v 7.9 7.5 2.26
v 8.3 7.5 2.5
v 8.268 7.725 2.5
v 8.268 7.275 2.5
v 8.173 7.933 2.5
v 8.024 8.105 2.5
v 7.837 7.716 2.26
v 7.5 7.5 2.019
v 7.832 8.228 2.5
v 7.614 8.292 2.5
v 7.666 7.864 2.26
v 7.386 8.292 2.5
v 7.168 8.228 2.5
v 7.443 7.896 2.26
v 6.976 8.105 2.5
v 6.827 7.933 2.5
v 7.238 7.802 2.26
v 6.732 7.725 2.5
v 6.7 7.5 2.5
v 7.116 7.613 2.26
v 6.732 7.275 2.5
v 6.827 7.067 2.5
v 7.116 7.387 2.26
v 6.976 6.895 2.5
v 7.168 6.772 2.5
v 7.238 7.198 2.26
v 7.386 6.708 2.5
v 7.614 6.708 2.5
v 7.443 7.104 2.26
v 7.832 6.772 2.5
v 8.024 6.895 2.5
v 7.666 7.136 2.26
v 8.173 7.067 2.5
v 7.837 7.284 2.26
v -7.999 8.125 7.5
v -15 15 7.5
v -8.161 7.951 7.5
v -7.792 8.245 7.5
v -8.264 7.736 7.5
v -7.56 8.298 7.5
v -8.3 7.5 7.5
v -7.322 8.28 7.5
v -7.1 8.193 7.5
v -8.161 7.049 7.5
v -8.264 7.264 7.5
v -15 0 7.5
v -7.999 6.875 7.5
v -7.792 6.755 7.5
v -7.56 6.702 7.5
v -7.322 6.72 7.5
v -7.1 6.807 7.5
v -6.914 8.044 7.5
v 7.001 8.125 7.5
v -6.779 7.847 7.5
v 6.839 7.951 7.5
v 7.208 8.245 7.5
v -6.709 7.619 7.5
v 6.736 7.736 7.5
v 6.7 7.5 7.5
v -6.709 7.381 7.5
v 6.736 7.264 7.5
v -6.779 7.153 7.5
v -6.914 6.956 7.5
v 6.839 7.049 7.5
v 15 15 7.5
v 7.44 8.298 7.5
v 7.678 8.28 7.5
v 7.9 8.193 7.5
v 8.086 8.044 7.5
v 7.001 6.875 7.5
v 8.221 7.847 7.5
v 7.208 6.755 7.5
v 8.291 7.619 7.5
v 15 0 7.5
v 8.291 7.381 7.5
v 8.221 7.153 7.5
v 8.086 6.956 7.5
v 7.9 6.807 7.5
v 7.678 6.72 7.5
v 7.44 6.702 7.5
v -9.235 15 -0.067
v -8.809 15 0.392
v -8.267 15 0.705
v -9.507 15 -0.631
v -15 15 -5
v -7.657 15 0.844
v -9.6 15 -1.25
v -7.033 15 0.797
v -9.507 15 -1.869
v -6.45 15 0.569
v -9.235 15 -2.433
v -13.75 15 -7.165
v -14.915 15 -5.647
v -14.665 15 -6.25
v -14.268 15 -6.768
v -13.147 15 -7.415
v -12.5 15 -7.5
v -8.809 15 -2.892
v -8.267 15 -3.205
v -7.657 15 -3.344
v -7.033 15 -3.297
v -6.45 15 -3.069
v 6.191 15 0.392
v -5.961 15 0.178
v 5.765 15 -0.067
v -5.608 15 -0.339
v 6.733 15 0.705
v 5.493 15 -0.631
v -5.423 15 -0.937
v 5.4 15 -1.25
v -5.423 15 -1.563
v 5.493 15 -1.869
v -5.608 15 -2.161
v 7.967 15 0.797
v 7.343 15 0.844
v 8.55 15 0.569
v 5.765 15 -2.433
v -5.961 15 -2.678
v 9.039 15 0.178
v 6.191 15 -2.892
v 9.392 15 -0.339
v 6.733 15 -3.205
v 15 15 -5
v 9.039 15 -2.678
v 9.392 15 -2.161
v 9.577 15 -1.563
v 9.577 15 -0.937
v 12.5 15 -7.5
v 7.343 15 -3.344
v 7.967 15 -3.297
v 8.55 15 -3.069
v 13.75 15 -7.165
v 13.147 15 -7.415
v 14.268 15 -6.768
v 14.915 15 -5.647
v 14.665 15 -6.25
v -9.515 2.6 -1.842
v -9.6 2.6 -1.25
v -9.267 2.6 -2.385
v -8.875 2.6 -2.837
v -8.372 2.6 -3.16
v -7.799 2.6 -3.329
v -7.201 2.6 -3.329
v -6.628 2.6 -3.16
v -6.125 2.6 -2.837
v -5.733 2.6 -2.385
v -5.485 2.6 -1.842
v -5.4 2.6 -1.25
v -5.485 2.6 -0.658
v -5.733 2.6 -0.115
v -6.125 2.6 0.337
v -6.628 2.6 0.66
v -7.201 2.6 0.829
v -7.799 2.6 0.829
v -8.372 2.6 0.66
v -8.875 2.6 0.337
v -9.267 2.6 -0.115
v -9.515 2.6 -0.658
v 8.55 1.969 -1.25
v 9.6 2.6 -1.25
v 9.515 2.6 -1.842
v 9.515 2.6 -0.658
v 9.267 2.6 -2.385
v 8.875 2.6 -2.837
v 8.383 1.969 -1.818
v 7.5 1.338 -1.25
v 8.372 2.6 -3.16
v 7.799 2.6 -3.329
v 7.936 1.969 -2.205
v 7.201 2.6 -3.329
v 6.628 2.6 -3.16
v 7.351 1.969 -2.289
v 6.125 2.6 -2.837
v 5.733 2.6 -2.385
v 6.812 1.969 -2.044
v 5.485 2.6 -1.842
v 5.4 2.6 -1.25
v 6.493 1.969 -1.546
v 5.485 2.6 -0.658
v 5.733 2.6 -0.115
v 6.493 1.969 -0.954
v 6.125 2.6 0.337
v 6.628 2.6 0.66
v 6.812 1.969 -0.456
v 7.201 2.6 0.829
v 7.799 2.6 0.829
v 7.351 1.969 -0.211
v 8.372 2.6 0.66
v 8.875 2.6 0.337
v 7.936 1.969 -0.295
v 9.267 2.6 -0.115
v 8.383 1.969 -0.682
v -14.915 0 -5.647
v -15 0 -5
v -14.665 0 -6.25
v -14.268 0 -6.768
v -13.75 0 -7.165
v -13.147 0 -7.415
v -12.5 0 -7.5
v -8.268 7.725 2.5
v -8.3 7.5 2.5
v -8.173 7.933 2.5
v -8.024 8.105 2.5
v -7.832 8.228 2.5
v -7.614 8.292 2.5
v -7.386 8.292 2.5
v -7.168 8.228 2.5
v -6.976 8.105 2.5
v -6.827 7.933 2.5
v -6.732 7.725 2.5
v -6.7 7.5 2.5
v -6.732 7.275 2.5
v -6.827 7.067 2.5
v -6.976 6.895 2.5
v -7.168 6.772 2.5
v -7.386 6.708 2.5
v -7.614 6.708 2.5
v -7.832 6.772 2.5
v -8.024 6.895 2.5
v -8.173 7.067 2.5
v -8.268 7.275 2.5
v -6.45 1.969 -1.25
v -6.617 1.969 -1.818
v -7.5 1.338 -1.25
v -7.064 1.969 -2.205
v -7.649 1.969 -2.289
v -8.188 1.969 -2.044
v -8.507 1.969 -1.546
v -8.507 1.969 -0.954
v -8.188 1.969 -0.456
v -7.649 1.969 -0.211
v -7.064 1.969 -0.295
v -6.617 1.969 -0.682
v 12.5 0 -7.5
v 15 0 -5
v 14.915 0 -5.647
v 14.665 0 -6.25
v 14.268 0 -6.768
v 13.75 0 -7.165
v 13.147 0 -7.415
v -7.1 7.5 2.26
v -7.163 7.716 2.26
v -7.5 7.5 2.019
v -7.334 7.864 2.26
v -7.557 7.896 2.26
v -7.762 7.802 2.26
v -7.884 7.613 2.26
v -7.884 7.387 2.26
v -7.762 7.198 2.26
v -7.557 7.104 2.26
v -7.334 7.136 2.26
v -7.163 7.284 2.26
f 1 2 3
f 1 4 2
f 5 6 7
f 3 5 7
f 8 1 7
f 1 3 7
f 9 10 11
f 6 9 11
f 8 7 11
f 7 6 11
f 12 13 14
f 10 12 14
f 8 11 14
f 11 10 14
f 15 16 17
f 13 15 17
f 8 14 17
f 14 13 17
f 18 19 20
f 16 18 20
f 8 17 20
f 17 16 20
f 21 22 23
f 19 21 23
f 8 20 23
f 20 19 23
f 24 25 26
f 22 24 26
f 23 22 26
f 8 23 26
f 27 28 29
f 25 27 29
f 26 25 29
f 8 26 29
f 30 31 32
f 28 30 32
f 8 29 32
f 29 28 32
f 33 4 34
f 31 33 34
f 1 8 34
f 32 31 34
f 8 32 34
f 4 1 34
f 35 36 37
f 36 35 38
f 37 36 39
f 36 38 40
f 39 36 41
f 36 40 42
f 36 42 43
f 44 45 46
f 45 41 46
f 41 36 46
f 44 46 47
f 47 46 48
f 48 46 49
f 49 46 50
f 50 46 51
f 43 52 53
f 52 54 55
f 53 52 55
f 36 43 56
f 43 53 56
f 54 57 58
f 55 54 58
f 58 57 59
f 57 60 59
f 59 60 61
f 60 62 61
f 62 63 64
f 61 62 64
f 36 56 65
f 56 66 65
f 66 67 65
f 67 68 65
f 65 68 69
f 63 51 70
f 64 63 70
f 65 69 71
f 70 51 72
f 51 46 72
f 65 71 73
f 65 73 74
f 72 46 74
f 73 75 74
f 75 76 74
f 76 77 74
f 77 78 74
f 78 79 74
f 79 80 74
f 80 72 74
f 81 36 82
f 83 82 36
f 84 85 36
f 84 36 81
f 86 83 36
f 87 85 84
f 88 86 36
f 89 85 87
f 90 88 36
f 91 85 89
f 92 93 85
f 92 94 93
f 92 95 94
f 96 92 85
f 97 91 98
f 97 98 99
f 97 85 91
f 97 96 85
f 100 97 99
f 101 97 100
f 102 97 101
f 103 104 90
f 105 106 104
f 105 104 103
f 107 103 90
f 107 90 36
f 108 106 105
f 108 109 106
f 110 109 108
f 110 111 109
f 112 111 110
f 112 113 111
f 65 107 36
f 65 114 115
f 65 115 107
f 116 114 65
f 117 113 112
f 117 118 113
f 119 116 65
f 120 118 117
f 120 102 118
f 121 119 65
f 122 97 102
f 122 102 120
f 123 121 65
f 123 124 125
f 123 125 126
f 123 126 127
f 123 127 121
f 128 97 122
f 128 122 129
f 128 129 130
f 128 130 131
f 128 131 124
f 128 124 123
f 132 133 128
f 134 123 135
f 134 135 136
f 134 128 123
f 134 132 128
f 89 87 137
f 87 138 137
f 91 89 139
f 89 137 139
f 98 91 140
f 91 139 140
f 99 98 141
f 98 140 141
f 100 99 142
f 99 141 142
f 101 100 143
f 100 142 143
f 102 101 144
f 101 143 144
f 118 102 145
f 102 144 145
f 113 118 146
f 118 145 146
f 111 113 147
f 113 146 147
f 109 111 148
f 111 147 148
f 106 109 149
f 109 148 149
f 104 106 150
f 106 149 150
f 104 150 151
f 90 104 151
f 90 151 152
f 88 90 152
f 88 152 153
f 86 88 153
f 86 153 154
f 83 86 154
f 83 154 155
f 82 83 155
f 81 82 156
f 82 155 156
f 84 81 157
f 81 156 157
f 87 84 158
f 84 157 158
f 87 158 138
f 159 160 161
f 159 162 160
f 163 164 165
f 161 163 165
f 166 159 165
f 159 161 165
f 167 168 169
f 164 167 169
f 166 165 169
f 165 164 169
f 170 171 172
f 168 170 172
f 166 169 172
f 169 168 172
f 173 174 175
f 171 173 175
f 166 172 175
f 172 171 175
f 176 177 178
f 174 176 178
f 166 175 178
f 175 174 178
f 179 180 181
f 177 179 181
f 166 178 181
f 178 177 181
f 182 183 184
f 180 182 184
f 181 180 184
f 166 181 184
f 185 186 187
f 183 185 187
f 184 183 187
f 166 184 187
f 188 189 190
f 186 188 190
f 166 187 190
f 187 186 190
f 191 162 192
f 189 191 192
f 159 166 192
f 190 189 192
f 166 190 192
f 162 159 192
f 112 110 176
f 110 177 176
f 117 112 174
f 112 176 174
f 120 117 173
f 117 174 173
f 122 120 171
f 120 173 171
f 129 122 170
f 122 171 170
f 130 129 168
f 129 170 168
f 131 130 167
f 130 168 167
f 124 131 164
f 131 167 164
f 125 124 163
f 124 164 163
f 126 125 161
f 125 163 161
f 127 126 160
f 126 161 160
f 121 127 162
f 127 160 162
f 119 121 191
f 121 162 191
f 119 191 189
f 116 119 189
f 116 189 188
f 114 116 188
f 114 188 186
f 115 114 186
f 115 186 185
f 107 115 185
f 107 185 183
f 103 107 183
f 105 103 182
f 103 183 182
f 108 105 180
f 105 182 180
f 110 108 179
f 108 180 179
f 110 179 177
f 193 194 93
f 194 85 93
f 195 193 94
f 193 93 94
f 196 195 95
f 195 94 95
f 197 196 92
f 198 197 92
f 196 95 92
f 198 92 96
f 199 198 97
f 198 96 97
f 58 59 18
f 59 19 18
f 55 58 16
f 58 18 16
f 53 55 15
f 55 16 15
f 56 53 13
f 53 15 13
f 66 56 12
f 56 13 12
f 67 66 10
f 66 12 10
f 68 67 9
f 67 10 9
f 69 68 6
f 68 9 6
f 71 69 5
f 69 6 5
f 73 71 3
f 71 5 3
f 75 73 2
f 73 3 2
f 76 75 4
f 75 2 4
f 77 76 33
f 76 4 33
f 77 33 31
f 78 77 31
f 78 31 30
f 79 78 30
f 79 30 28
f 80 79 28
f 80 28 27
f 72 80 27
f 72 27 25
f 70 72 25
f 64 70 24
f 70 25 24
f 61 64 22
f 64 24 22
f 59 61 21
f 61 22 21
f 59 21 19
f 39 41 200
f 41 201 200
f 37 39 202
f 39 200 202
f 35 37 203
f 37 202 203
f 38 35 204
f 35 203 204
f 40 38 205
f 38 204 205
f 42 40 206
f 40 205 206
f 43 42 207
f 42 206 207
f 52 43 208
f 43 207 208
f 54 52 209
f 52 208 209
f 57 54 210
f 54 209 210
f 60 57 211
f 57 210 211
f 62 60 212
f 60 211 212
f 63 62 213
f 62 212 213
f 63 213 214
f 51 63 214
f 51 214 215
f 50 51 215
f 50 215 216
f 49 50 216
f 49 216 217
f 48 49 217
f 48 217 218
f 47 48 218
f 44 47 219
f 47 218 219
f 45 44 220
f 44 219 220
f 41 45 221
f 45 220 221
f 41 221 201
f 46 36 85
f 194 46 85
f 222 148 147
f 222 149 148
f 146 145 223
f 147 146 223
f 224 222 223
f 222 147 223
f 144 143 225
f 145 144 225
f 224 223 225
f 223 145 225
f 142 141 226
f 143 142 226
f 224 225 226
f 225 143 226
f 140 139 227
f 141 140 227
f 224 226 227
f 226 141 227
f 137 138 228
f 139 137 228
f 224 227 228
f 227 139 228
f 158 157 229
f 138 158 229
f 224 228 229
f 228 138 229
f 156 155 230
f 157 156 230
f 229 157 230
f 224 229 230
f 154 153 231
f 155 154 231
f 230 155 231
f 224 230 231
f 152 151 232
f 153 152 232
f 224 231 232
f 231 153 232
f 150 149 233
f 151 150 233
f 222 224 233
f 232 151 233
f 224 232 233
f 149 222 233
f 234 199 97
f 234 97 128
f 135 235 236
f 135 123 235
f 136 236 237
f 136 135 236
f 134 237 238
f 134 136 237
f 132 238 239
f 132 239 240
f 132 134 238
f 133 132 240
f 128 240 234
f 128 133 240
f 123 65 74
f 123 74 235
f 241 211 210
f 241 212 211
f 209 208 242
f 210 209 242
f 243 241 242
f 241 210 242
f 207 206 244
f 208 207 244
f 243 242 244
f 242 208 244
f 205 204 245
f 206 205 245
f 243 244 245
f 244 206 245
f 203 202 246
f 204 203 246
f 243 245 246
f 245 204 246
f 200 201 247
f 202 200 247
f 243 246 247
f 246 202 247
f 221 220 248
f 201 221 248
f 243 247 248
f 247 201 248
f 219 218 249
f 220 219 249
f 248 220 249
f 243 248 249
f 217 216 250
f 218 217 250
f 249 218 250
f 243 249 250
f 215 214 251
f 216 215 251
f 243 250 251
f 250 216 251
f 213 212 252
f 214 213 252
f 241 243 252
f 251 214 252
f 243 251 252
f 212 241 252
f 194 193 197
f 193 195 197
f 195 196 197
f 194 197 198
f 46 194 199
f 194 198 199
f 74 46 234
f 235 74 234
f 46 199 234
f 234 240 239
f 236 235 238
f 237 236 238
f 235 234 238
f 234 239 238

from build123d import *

# Parameters (mm, degrees)
SKETCH1_W             = 30
SKETCH1_H             = 15
BOSS_EXTRUDE1_DEPTH   = 15
FILLET1_R             = 2.5
M5_TAPPED_HOLE1_D     = 4.2
M5_TAPPED_HOLE1_DEPTH = 12.4
M5_TAPPED_HOLE1_TIP   = 1.2618073
M2_TAPPED_HOLE1_D     = 1.6
M2_TAPPED_HOLE1_DEPTH = 5
M2_TAPPED_HOLE1_TIP   = 0.480688495


with BuildPart() as part:
    # Sketch1 → Boss-Extrude1 (new body)
    with BuildSketch(Plane(origin=(0, 0, 0), x_dir=(1, 0, 0), z_dir=(0, 1, 0))):
        Rectangle(SKETCH1_W, SKETCH1_H)
    extrude(amount=BOSS_EXTRUDE1_DEPTH)

    # Fillet1
    fillet1_edges = [part.edges().sort_by_distance(p)[0] for p in [
        (-15, 7.5, -7.5),
        (15, 7.5, -7.5),
    ]]
    fillet(fillet1_edges, radius=FILLET1_R)

    # M5 Tapped Hole1
    with Locations(Plane(origin=(0, 15, 0), x_dir=(1, 0, 0), z_dir=(0, 1, 0))):
        with Locations((-7.5, 1.25), (7.5, 1.25)):
            Hole(M5_TAPPED_HOLE1_D / 2, depth=M5_TAPPED_HOLE1_DEPTH)
            with Locations((0, 0, -(M5_TAPPED_HOLE1_DEPTH + M5_TAPPED_HOLE1_TIP / 2))):  # 118° drill point
                Cone(0, M5_TAPPED_HOLE1_D / 2, M5_TAPPED_HOLE1_TIP, mode=Mode.SUBTRACT)

    # M2 Tapped Hole1
    with Locations(Plane.XY.offset(7.5)):
        with Locations((7.5, 7.5), (-7.5, 7.5)):
            Hole(M2_TAPPED_HOLE1_D / 2, depth=M2_TAPPED_HOLE1_DEPTH)
            with Locations((0, 0, -(M2_TAPPED_HOLE1_DEPTH + M2_TAPPED_HOLE1_TIP / 2))):  # 118° drill point
                Cone(0, M2_TAPPED_HOLE1_D / 2, M2_TAPPED_HOLE1_TIP, mode=Mode.SUBTRACT)


solid = part.part
